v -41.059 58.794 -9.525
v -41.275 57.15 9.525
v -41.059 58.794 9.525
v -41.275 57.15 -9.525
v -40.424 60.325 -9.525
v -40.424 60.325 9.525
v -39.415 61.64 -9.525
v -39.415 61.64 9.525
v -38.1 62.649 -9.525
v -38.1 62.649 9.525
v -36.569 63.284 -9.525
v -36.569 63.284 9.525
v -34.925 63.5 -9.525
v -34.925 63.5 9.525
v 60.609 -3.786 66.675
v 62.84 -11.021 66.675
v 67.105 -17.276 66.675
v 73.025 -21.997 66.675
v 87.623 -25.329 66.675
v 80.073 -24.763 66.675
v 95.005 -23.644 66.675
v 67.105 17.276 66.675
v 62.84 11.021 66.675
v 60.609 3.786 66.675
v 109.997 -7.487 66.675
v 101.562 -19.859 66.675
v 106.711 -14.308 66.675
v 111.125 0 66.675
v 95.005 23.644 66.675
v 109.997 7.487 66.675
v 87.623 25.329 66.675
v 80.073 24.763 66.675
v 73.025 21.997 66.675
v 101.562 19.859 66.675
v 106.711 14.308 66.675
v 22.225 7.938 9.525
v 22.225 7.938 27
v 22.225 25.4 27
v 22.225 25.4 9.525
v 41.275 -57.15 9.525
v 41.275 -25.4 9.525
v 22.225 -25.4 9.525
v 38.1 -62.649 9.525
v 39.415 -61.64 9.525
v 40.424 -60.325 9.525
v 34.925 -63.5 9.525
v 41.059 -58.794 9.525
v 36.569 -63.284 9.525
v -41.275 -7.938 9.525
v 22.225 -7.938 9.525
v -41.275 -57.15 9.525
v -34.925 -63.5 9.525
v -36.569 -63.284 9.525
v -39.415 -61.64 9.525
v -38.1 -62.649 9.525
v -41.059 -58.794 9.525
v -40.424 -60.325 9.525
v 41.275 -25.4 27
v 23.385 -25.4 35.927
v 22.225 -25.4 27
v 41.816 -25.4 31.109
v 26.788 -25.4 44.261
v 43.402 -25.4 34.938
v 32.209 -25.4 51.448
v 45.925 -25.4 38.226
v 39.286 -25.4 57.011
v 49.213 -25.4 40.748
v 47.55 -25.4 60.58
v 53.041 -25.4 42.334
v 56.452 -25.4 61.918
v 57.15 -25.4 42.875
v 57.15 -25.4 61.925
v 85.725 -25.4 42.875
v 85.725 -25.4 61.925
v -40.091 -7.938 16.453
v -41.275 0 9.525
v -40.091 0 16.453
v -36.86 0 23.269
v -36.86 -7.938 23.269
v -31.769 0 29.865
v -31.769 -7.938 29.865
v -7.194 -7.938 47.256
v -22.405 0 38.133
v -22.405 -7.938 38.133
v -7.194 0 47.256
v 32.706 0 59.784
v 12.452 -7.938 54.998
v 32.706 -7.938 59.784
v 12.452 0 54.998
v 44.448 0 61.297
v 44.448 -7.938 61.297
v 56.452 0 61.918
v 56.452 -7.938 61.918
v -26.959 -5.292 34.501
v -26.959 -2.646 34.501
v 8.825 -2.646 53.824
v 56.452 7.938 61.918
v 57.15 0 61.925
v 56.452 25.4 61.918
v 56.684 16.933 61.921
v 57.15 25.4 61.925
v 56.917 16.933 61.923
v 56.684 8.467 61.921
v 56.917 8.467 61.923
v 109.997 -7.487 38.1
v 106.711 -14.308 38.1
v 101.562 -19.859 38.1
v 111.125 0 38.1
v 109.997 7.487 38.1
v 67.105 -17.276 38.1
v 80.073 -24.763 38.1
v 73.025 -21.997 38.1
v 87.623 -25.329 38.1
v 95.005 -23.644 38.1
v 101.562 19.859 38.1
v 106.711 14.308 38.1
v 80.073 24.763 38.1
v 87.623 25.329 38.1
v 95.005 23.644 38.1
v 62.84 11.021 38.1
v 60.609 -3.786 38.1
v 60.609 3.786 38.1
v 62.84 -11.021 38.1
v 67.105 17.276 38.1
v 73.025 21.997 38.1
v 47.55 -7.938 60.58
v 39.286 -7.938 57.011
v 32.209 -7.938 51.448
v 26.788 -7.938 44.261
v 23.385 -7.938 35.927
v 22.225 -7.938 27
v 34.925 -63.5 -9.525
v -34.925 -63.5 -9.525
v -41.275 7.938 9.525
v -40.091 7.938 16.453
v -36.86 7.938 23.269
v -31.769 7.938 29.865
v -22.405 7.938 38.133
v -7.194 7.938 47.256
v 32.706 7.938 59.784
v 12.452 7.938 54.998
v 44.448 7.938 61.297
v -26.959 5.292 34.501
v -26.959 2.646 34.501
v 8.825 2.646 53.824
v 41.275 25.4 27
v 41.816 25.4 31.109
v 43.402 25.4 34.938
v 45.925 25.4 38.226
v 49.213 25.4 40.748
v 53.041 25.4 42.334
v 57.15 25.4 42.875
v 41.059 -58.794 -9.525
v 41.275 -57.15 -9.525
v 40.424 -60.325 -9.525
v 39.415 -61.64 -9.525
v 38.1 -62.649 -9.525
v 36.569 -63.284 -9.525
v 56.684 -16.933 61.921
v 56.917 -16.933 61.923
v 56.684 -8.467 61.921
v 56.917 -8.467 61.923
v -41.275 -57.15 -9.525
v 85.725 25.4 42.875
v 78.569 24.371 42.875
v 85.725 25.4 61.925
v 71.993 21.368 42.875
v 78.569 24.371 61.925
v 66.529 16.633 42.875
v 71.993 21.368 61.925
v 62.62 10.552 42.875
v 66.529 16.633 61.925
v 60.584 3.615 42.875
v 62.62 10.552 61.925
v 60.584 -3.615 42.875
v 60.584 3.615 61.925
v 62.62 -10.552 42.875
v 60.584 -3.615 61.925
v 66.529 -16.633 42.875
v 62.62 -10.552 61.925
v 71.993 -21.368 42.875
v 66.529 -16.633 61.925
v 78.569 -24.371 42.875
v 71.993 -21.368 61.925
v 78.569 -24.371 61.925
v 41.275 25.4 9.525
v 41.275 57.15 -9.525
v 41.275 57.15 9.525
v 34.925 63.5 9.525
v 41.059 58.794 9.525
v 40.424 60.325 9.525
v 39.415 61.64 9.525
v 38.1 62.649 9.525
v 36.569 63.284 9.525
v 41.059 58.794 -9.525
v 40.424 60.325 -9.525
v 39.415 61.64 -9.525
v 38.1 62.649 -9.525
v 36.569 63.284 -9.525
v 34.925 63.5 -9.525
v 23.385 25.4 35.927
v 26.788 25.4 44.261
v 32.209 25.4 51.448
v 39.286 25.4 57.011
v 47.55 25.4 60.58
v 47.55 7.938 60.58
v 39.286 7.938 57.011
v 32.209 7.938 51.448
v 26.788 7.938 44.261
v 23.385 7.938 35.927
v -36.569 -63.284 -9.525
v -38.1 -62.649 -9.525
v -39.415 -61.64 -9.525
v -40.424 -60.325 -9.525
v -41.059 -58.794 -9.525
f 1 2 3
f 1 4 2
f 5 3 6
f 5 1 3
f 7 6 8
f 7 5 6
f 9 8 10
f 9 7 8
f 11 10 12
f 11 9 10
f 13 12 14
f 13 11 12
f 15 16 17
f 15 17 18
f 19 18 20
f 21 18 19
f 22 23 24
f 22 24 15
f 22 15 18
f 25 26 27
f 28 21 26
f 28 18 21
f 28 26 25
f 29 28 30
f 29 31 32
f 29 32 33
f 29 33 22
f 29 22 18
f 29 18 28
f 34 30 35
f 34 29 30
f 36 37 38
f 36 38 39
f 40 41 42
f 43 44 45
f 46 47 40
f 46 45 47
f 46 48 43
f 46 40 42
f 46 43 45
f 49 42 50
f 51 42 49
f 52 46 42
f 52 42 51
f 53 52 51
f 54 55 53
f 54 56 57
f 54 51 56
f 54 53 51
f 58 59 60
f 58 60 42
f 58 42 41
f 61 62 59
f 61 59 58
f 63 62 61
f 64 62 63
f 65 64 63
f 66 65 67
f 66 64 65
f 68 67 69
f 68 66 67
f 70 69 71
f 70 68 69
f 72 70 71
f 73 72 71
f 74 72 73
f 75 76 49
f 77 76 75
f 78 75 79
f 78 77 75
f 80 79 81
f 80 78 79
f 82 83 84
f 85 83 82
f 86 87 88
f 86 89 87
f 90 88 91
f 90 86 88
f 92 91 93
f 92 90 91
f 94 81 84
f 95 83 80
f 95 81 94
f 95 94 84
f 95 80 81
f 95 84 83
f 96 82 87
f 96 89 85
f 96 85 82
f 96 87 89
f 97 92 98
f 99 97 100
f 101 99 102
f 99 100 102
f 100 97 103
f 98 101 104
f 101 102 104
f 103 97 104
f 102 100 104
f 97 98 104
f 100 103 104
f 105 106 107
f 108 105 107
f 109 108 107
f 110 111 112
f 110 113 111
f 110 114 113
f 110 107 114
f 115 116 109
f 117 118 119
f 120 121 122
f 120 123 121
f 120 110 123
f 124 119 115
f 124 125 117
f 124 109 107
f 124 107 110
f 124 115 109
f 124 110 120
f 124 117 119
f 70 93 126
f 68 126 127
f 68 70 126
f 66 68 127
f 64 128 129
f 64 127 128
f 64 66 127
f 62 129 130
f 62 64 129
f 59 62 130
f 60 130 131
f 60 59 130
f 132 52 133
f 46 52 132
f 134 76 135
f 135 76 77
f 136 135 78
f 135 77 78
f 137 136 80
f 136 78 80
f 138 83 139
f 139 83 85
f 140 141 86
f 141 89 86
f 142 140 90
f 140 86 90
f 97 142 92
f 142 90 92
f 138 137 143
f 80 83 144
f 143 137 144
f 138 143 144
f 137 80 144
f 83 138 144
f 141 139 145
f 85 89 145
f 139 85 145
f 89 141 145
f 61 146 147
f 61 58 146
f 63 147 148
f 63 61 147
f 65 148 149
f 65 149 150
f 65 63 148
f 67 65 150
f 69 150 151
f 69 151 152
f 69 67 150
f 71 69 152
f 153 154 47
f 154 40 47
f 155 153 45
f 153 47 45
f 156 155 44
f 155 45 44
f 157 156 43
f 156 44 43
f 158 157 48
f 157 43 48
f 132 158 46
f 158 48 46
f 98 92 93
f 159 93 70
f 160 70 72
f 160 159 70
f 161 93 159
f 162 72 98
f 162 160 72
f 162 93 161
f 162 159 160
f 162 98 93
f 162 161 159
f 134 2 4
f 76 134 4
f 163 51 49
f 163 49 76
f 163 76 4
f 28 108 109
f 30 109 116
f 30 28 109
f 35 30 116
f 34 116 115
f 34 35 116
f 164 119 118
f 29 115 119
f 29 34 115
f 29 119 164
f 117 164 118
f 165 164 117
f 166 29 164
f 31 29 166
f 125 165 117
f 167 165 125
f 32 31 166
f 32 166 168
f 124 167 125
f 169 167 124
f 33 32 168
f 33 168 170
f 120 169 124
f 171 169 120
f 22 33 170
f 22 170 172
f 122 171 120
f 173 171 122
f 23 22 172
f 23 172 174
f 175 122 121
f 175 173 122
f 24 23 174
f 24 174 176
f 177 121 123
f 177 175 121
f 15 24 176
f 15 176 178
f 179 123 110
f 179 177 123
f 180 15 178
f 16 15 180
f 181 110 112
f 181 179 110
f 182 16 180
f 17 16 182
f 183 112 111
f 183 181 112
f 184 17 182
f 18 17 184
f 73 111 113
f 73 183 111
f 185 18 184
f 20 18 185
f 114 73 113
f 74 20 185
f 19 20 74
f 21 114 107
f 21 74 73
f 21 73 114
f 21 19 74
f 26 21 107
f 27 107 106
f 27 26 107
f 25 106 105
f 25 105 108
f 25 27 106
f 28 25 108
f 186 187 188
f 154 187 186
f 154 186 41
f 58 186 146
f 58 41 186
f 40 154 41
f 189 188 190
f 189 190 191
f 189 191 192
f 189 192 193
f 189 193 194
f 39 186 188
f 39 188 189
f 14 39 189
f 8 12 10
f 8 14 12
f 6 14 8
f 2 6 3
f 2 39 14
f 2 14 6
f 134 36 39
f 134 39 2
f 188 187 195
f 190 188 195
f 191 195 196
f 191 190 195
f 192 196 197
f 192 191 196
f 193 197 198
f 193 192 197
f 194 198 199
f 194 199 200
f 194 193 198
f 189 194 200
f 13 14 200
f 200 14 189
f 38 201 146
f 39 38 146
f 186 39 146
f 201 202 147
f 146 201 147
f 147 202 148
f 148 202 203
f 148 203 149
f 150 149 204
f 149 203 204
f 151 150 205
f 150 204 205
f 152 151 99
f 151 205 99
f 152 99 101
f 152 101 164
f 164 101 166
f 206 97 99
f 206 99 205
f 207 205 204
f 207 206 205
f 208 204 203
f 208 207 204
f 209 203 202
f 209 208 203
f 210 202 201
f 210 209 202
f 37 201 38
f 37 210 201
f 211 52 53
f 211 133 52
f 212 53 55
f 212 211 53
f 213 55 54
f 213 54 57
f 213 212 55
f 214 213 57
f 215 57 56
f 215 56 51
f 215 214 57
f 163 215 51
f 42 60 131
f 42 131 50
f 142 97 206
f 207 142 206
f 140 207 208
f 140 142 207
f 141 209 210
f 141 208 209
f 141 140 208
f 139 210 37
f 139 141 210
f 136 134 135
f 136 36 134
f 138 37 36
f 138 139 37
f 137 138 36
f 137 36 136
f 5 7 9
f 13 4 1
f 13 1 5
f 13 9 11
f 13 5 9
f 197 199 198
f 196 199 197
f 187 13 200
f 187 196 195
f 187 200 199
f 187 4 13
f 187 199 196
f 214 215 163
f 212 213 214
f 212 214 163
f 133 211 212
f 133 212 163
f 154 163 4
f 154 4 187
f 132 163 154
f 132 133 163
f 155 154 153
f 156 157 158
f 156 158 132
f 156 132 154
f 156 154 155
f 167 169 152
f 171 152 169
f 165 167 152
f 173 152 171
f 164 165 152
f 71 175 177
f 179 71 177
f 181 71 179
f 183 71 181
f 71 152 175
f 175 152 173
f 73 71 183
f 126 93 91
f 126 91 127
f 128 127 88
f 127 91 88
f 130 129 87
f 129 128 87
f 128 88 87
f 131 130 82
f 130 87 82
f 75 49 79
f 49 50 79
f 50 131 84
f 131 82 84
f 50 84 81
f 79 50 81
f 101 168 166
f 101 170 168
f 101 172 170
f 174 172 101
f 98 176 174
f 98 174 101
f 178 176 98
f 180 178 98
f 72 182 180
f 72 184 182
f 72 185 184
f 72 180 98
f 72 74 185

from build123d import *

# Parameters (mm, degrees)
F1_DEPTH = 63.5
F0_W     = 25.4
F0_H     = 19.05
F2_DEPTH = 25.4
F3_DEPTH = 7.9375
F5_R     = 6.35


with BuildPart() as f1:
    # F0 (on Front) → F1 (new body, symmetric)
    with BuildSketch(Plane.XZ):
        Polygon((-41.275, 9.525), (-41.275, -9.525), (41.275, -9.525), (41.275, 9.525), (22.225, 9.525), align=None)
    extrude(amount=F1_DEPTH, both=True)

    # F0 (on Front) → F2 (join, symmetric)
    with BuildSketch(Plane.XZ):
        with Locations((73.025, 52.4002)):
            Rectangle(F0_W, F0_H)
        with BuildLine():
            Line((22.225, 9.525), (41.275, 9.525))
            Line((41.275, 9.525), (41.275, 27.0002))
            ThreePointArc((41.275, 27.0002), (45.9246798487, 38.2255201513), (57.15, 42.8752))
            Line((57.15, 42.8752), (60.325, 42.8752))
            Line((60.325, 42.8752), (60.325, 61.9252))
            Line((60.325, 61.9252), (57.15, 61.9252))
            add(Edge.make_bspline(
                [(56.4515488483, 61.9182152785), (56.6842963027, 61.9210832952), (56.9171147806, 61.9234123626), (57.15, 61.9252)],
                knots=[110.9913484912, 110.9913484912, 110.9913484912, 110.9913484912, 111.5045361635, 111.5045361635, 111.5045361635, 111.5045361635], degree=3))
            ThreePointArc((56.4515488483, 61.9182152785), (32.2085783136, 51.4477174458), (22.225, 27.0002))
            Line((22.225, 27.0002), (22.225, 9.525))
        make_face()
    extrude(amount=F2_DEPTH, both=True)

    # F0 (on Front) → F3 (join, symmetric)
    with BuildSketch(Plane.XZ):
        with BuildLine():
            add(Edge.make_bspline(
                [(-41.275, 9.525), (-40.9026709166, 35.4675879968), (6.1133291004, 61.2979255596), (56.4515488483, 61.9182152785)],
                knots=[0, 0, 0, 0, 110.9913484912, 110.9913484912, 110.9913484912, 110.9913484912], degree=3))
            Line((-41.275, 9.525), (22.225, 9.525))
            Line((22.225, 9.525), (22.225, 27.0002))
            ThreePointArc((22.225, 27.0002), (32.2085783136, 51.4477174458), (56.4515488483, 61.9182152785))
        make_face()
    extrude(amount=F3_DEPTH, both=True)

    # F0 (on Front) → F4 (revolve)
    with BuildSketch(Plane.XZ):
        Polygon((85.725, 66.675), (85.725, 61.9252), (85.725, 42.8752), (85.725, 38.1), (111.125, 38.1), (111.125, 66.675), align=None)
    revolve(axis=Axis((85.725, 0, 52.3875), (0, 0, 1)))

    # F5
    f5_edges = [f1.edges().sort_by_distance(p)[0] for p in [
        (41.275, -63.5, 0),
        (-41.275, -63.5, 0),
        (41.275, 63.5, 0),
        (-41.275, 63.5, 0),
    ]]
    fillet(f5_edges, radius=F5_R)


solid = f1.part
